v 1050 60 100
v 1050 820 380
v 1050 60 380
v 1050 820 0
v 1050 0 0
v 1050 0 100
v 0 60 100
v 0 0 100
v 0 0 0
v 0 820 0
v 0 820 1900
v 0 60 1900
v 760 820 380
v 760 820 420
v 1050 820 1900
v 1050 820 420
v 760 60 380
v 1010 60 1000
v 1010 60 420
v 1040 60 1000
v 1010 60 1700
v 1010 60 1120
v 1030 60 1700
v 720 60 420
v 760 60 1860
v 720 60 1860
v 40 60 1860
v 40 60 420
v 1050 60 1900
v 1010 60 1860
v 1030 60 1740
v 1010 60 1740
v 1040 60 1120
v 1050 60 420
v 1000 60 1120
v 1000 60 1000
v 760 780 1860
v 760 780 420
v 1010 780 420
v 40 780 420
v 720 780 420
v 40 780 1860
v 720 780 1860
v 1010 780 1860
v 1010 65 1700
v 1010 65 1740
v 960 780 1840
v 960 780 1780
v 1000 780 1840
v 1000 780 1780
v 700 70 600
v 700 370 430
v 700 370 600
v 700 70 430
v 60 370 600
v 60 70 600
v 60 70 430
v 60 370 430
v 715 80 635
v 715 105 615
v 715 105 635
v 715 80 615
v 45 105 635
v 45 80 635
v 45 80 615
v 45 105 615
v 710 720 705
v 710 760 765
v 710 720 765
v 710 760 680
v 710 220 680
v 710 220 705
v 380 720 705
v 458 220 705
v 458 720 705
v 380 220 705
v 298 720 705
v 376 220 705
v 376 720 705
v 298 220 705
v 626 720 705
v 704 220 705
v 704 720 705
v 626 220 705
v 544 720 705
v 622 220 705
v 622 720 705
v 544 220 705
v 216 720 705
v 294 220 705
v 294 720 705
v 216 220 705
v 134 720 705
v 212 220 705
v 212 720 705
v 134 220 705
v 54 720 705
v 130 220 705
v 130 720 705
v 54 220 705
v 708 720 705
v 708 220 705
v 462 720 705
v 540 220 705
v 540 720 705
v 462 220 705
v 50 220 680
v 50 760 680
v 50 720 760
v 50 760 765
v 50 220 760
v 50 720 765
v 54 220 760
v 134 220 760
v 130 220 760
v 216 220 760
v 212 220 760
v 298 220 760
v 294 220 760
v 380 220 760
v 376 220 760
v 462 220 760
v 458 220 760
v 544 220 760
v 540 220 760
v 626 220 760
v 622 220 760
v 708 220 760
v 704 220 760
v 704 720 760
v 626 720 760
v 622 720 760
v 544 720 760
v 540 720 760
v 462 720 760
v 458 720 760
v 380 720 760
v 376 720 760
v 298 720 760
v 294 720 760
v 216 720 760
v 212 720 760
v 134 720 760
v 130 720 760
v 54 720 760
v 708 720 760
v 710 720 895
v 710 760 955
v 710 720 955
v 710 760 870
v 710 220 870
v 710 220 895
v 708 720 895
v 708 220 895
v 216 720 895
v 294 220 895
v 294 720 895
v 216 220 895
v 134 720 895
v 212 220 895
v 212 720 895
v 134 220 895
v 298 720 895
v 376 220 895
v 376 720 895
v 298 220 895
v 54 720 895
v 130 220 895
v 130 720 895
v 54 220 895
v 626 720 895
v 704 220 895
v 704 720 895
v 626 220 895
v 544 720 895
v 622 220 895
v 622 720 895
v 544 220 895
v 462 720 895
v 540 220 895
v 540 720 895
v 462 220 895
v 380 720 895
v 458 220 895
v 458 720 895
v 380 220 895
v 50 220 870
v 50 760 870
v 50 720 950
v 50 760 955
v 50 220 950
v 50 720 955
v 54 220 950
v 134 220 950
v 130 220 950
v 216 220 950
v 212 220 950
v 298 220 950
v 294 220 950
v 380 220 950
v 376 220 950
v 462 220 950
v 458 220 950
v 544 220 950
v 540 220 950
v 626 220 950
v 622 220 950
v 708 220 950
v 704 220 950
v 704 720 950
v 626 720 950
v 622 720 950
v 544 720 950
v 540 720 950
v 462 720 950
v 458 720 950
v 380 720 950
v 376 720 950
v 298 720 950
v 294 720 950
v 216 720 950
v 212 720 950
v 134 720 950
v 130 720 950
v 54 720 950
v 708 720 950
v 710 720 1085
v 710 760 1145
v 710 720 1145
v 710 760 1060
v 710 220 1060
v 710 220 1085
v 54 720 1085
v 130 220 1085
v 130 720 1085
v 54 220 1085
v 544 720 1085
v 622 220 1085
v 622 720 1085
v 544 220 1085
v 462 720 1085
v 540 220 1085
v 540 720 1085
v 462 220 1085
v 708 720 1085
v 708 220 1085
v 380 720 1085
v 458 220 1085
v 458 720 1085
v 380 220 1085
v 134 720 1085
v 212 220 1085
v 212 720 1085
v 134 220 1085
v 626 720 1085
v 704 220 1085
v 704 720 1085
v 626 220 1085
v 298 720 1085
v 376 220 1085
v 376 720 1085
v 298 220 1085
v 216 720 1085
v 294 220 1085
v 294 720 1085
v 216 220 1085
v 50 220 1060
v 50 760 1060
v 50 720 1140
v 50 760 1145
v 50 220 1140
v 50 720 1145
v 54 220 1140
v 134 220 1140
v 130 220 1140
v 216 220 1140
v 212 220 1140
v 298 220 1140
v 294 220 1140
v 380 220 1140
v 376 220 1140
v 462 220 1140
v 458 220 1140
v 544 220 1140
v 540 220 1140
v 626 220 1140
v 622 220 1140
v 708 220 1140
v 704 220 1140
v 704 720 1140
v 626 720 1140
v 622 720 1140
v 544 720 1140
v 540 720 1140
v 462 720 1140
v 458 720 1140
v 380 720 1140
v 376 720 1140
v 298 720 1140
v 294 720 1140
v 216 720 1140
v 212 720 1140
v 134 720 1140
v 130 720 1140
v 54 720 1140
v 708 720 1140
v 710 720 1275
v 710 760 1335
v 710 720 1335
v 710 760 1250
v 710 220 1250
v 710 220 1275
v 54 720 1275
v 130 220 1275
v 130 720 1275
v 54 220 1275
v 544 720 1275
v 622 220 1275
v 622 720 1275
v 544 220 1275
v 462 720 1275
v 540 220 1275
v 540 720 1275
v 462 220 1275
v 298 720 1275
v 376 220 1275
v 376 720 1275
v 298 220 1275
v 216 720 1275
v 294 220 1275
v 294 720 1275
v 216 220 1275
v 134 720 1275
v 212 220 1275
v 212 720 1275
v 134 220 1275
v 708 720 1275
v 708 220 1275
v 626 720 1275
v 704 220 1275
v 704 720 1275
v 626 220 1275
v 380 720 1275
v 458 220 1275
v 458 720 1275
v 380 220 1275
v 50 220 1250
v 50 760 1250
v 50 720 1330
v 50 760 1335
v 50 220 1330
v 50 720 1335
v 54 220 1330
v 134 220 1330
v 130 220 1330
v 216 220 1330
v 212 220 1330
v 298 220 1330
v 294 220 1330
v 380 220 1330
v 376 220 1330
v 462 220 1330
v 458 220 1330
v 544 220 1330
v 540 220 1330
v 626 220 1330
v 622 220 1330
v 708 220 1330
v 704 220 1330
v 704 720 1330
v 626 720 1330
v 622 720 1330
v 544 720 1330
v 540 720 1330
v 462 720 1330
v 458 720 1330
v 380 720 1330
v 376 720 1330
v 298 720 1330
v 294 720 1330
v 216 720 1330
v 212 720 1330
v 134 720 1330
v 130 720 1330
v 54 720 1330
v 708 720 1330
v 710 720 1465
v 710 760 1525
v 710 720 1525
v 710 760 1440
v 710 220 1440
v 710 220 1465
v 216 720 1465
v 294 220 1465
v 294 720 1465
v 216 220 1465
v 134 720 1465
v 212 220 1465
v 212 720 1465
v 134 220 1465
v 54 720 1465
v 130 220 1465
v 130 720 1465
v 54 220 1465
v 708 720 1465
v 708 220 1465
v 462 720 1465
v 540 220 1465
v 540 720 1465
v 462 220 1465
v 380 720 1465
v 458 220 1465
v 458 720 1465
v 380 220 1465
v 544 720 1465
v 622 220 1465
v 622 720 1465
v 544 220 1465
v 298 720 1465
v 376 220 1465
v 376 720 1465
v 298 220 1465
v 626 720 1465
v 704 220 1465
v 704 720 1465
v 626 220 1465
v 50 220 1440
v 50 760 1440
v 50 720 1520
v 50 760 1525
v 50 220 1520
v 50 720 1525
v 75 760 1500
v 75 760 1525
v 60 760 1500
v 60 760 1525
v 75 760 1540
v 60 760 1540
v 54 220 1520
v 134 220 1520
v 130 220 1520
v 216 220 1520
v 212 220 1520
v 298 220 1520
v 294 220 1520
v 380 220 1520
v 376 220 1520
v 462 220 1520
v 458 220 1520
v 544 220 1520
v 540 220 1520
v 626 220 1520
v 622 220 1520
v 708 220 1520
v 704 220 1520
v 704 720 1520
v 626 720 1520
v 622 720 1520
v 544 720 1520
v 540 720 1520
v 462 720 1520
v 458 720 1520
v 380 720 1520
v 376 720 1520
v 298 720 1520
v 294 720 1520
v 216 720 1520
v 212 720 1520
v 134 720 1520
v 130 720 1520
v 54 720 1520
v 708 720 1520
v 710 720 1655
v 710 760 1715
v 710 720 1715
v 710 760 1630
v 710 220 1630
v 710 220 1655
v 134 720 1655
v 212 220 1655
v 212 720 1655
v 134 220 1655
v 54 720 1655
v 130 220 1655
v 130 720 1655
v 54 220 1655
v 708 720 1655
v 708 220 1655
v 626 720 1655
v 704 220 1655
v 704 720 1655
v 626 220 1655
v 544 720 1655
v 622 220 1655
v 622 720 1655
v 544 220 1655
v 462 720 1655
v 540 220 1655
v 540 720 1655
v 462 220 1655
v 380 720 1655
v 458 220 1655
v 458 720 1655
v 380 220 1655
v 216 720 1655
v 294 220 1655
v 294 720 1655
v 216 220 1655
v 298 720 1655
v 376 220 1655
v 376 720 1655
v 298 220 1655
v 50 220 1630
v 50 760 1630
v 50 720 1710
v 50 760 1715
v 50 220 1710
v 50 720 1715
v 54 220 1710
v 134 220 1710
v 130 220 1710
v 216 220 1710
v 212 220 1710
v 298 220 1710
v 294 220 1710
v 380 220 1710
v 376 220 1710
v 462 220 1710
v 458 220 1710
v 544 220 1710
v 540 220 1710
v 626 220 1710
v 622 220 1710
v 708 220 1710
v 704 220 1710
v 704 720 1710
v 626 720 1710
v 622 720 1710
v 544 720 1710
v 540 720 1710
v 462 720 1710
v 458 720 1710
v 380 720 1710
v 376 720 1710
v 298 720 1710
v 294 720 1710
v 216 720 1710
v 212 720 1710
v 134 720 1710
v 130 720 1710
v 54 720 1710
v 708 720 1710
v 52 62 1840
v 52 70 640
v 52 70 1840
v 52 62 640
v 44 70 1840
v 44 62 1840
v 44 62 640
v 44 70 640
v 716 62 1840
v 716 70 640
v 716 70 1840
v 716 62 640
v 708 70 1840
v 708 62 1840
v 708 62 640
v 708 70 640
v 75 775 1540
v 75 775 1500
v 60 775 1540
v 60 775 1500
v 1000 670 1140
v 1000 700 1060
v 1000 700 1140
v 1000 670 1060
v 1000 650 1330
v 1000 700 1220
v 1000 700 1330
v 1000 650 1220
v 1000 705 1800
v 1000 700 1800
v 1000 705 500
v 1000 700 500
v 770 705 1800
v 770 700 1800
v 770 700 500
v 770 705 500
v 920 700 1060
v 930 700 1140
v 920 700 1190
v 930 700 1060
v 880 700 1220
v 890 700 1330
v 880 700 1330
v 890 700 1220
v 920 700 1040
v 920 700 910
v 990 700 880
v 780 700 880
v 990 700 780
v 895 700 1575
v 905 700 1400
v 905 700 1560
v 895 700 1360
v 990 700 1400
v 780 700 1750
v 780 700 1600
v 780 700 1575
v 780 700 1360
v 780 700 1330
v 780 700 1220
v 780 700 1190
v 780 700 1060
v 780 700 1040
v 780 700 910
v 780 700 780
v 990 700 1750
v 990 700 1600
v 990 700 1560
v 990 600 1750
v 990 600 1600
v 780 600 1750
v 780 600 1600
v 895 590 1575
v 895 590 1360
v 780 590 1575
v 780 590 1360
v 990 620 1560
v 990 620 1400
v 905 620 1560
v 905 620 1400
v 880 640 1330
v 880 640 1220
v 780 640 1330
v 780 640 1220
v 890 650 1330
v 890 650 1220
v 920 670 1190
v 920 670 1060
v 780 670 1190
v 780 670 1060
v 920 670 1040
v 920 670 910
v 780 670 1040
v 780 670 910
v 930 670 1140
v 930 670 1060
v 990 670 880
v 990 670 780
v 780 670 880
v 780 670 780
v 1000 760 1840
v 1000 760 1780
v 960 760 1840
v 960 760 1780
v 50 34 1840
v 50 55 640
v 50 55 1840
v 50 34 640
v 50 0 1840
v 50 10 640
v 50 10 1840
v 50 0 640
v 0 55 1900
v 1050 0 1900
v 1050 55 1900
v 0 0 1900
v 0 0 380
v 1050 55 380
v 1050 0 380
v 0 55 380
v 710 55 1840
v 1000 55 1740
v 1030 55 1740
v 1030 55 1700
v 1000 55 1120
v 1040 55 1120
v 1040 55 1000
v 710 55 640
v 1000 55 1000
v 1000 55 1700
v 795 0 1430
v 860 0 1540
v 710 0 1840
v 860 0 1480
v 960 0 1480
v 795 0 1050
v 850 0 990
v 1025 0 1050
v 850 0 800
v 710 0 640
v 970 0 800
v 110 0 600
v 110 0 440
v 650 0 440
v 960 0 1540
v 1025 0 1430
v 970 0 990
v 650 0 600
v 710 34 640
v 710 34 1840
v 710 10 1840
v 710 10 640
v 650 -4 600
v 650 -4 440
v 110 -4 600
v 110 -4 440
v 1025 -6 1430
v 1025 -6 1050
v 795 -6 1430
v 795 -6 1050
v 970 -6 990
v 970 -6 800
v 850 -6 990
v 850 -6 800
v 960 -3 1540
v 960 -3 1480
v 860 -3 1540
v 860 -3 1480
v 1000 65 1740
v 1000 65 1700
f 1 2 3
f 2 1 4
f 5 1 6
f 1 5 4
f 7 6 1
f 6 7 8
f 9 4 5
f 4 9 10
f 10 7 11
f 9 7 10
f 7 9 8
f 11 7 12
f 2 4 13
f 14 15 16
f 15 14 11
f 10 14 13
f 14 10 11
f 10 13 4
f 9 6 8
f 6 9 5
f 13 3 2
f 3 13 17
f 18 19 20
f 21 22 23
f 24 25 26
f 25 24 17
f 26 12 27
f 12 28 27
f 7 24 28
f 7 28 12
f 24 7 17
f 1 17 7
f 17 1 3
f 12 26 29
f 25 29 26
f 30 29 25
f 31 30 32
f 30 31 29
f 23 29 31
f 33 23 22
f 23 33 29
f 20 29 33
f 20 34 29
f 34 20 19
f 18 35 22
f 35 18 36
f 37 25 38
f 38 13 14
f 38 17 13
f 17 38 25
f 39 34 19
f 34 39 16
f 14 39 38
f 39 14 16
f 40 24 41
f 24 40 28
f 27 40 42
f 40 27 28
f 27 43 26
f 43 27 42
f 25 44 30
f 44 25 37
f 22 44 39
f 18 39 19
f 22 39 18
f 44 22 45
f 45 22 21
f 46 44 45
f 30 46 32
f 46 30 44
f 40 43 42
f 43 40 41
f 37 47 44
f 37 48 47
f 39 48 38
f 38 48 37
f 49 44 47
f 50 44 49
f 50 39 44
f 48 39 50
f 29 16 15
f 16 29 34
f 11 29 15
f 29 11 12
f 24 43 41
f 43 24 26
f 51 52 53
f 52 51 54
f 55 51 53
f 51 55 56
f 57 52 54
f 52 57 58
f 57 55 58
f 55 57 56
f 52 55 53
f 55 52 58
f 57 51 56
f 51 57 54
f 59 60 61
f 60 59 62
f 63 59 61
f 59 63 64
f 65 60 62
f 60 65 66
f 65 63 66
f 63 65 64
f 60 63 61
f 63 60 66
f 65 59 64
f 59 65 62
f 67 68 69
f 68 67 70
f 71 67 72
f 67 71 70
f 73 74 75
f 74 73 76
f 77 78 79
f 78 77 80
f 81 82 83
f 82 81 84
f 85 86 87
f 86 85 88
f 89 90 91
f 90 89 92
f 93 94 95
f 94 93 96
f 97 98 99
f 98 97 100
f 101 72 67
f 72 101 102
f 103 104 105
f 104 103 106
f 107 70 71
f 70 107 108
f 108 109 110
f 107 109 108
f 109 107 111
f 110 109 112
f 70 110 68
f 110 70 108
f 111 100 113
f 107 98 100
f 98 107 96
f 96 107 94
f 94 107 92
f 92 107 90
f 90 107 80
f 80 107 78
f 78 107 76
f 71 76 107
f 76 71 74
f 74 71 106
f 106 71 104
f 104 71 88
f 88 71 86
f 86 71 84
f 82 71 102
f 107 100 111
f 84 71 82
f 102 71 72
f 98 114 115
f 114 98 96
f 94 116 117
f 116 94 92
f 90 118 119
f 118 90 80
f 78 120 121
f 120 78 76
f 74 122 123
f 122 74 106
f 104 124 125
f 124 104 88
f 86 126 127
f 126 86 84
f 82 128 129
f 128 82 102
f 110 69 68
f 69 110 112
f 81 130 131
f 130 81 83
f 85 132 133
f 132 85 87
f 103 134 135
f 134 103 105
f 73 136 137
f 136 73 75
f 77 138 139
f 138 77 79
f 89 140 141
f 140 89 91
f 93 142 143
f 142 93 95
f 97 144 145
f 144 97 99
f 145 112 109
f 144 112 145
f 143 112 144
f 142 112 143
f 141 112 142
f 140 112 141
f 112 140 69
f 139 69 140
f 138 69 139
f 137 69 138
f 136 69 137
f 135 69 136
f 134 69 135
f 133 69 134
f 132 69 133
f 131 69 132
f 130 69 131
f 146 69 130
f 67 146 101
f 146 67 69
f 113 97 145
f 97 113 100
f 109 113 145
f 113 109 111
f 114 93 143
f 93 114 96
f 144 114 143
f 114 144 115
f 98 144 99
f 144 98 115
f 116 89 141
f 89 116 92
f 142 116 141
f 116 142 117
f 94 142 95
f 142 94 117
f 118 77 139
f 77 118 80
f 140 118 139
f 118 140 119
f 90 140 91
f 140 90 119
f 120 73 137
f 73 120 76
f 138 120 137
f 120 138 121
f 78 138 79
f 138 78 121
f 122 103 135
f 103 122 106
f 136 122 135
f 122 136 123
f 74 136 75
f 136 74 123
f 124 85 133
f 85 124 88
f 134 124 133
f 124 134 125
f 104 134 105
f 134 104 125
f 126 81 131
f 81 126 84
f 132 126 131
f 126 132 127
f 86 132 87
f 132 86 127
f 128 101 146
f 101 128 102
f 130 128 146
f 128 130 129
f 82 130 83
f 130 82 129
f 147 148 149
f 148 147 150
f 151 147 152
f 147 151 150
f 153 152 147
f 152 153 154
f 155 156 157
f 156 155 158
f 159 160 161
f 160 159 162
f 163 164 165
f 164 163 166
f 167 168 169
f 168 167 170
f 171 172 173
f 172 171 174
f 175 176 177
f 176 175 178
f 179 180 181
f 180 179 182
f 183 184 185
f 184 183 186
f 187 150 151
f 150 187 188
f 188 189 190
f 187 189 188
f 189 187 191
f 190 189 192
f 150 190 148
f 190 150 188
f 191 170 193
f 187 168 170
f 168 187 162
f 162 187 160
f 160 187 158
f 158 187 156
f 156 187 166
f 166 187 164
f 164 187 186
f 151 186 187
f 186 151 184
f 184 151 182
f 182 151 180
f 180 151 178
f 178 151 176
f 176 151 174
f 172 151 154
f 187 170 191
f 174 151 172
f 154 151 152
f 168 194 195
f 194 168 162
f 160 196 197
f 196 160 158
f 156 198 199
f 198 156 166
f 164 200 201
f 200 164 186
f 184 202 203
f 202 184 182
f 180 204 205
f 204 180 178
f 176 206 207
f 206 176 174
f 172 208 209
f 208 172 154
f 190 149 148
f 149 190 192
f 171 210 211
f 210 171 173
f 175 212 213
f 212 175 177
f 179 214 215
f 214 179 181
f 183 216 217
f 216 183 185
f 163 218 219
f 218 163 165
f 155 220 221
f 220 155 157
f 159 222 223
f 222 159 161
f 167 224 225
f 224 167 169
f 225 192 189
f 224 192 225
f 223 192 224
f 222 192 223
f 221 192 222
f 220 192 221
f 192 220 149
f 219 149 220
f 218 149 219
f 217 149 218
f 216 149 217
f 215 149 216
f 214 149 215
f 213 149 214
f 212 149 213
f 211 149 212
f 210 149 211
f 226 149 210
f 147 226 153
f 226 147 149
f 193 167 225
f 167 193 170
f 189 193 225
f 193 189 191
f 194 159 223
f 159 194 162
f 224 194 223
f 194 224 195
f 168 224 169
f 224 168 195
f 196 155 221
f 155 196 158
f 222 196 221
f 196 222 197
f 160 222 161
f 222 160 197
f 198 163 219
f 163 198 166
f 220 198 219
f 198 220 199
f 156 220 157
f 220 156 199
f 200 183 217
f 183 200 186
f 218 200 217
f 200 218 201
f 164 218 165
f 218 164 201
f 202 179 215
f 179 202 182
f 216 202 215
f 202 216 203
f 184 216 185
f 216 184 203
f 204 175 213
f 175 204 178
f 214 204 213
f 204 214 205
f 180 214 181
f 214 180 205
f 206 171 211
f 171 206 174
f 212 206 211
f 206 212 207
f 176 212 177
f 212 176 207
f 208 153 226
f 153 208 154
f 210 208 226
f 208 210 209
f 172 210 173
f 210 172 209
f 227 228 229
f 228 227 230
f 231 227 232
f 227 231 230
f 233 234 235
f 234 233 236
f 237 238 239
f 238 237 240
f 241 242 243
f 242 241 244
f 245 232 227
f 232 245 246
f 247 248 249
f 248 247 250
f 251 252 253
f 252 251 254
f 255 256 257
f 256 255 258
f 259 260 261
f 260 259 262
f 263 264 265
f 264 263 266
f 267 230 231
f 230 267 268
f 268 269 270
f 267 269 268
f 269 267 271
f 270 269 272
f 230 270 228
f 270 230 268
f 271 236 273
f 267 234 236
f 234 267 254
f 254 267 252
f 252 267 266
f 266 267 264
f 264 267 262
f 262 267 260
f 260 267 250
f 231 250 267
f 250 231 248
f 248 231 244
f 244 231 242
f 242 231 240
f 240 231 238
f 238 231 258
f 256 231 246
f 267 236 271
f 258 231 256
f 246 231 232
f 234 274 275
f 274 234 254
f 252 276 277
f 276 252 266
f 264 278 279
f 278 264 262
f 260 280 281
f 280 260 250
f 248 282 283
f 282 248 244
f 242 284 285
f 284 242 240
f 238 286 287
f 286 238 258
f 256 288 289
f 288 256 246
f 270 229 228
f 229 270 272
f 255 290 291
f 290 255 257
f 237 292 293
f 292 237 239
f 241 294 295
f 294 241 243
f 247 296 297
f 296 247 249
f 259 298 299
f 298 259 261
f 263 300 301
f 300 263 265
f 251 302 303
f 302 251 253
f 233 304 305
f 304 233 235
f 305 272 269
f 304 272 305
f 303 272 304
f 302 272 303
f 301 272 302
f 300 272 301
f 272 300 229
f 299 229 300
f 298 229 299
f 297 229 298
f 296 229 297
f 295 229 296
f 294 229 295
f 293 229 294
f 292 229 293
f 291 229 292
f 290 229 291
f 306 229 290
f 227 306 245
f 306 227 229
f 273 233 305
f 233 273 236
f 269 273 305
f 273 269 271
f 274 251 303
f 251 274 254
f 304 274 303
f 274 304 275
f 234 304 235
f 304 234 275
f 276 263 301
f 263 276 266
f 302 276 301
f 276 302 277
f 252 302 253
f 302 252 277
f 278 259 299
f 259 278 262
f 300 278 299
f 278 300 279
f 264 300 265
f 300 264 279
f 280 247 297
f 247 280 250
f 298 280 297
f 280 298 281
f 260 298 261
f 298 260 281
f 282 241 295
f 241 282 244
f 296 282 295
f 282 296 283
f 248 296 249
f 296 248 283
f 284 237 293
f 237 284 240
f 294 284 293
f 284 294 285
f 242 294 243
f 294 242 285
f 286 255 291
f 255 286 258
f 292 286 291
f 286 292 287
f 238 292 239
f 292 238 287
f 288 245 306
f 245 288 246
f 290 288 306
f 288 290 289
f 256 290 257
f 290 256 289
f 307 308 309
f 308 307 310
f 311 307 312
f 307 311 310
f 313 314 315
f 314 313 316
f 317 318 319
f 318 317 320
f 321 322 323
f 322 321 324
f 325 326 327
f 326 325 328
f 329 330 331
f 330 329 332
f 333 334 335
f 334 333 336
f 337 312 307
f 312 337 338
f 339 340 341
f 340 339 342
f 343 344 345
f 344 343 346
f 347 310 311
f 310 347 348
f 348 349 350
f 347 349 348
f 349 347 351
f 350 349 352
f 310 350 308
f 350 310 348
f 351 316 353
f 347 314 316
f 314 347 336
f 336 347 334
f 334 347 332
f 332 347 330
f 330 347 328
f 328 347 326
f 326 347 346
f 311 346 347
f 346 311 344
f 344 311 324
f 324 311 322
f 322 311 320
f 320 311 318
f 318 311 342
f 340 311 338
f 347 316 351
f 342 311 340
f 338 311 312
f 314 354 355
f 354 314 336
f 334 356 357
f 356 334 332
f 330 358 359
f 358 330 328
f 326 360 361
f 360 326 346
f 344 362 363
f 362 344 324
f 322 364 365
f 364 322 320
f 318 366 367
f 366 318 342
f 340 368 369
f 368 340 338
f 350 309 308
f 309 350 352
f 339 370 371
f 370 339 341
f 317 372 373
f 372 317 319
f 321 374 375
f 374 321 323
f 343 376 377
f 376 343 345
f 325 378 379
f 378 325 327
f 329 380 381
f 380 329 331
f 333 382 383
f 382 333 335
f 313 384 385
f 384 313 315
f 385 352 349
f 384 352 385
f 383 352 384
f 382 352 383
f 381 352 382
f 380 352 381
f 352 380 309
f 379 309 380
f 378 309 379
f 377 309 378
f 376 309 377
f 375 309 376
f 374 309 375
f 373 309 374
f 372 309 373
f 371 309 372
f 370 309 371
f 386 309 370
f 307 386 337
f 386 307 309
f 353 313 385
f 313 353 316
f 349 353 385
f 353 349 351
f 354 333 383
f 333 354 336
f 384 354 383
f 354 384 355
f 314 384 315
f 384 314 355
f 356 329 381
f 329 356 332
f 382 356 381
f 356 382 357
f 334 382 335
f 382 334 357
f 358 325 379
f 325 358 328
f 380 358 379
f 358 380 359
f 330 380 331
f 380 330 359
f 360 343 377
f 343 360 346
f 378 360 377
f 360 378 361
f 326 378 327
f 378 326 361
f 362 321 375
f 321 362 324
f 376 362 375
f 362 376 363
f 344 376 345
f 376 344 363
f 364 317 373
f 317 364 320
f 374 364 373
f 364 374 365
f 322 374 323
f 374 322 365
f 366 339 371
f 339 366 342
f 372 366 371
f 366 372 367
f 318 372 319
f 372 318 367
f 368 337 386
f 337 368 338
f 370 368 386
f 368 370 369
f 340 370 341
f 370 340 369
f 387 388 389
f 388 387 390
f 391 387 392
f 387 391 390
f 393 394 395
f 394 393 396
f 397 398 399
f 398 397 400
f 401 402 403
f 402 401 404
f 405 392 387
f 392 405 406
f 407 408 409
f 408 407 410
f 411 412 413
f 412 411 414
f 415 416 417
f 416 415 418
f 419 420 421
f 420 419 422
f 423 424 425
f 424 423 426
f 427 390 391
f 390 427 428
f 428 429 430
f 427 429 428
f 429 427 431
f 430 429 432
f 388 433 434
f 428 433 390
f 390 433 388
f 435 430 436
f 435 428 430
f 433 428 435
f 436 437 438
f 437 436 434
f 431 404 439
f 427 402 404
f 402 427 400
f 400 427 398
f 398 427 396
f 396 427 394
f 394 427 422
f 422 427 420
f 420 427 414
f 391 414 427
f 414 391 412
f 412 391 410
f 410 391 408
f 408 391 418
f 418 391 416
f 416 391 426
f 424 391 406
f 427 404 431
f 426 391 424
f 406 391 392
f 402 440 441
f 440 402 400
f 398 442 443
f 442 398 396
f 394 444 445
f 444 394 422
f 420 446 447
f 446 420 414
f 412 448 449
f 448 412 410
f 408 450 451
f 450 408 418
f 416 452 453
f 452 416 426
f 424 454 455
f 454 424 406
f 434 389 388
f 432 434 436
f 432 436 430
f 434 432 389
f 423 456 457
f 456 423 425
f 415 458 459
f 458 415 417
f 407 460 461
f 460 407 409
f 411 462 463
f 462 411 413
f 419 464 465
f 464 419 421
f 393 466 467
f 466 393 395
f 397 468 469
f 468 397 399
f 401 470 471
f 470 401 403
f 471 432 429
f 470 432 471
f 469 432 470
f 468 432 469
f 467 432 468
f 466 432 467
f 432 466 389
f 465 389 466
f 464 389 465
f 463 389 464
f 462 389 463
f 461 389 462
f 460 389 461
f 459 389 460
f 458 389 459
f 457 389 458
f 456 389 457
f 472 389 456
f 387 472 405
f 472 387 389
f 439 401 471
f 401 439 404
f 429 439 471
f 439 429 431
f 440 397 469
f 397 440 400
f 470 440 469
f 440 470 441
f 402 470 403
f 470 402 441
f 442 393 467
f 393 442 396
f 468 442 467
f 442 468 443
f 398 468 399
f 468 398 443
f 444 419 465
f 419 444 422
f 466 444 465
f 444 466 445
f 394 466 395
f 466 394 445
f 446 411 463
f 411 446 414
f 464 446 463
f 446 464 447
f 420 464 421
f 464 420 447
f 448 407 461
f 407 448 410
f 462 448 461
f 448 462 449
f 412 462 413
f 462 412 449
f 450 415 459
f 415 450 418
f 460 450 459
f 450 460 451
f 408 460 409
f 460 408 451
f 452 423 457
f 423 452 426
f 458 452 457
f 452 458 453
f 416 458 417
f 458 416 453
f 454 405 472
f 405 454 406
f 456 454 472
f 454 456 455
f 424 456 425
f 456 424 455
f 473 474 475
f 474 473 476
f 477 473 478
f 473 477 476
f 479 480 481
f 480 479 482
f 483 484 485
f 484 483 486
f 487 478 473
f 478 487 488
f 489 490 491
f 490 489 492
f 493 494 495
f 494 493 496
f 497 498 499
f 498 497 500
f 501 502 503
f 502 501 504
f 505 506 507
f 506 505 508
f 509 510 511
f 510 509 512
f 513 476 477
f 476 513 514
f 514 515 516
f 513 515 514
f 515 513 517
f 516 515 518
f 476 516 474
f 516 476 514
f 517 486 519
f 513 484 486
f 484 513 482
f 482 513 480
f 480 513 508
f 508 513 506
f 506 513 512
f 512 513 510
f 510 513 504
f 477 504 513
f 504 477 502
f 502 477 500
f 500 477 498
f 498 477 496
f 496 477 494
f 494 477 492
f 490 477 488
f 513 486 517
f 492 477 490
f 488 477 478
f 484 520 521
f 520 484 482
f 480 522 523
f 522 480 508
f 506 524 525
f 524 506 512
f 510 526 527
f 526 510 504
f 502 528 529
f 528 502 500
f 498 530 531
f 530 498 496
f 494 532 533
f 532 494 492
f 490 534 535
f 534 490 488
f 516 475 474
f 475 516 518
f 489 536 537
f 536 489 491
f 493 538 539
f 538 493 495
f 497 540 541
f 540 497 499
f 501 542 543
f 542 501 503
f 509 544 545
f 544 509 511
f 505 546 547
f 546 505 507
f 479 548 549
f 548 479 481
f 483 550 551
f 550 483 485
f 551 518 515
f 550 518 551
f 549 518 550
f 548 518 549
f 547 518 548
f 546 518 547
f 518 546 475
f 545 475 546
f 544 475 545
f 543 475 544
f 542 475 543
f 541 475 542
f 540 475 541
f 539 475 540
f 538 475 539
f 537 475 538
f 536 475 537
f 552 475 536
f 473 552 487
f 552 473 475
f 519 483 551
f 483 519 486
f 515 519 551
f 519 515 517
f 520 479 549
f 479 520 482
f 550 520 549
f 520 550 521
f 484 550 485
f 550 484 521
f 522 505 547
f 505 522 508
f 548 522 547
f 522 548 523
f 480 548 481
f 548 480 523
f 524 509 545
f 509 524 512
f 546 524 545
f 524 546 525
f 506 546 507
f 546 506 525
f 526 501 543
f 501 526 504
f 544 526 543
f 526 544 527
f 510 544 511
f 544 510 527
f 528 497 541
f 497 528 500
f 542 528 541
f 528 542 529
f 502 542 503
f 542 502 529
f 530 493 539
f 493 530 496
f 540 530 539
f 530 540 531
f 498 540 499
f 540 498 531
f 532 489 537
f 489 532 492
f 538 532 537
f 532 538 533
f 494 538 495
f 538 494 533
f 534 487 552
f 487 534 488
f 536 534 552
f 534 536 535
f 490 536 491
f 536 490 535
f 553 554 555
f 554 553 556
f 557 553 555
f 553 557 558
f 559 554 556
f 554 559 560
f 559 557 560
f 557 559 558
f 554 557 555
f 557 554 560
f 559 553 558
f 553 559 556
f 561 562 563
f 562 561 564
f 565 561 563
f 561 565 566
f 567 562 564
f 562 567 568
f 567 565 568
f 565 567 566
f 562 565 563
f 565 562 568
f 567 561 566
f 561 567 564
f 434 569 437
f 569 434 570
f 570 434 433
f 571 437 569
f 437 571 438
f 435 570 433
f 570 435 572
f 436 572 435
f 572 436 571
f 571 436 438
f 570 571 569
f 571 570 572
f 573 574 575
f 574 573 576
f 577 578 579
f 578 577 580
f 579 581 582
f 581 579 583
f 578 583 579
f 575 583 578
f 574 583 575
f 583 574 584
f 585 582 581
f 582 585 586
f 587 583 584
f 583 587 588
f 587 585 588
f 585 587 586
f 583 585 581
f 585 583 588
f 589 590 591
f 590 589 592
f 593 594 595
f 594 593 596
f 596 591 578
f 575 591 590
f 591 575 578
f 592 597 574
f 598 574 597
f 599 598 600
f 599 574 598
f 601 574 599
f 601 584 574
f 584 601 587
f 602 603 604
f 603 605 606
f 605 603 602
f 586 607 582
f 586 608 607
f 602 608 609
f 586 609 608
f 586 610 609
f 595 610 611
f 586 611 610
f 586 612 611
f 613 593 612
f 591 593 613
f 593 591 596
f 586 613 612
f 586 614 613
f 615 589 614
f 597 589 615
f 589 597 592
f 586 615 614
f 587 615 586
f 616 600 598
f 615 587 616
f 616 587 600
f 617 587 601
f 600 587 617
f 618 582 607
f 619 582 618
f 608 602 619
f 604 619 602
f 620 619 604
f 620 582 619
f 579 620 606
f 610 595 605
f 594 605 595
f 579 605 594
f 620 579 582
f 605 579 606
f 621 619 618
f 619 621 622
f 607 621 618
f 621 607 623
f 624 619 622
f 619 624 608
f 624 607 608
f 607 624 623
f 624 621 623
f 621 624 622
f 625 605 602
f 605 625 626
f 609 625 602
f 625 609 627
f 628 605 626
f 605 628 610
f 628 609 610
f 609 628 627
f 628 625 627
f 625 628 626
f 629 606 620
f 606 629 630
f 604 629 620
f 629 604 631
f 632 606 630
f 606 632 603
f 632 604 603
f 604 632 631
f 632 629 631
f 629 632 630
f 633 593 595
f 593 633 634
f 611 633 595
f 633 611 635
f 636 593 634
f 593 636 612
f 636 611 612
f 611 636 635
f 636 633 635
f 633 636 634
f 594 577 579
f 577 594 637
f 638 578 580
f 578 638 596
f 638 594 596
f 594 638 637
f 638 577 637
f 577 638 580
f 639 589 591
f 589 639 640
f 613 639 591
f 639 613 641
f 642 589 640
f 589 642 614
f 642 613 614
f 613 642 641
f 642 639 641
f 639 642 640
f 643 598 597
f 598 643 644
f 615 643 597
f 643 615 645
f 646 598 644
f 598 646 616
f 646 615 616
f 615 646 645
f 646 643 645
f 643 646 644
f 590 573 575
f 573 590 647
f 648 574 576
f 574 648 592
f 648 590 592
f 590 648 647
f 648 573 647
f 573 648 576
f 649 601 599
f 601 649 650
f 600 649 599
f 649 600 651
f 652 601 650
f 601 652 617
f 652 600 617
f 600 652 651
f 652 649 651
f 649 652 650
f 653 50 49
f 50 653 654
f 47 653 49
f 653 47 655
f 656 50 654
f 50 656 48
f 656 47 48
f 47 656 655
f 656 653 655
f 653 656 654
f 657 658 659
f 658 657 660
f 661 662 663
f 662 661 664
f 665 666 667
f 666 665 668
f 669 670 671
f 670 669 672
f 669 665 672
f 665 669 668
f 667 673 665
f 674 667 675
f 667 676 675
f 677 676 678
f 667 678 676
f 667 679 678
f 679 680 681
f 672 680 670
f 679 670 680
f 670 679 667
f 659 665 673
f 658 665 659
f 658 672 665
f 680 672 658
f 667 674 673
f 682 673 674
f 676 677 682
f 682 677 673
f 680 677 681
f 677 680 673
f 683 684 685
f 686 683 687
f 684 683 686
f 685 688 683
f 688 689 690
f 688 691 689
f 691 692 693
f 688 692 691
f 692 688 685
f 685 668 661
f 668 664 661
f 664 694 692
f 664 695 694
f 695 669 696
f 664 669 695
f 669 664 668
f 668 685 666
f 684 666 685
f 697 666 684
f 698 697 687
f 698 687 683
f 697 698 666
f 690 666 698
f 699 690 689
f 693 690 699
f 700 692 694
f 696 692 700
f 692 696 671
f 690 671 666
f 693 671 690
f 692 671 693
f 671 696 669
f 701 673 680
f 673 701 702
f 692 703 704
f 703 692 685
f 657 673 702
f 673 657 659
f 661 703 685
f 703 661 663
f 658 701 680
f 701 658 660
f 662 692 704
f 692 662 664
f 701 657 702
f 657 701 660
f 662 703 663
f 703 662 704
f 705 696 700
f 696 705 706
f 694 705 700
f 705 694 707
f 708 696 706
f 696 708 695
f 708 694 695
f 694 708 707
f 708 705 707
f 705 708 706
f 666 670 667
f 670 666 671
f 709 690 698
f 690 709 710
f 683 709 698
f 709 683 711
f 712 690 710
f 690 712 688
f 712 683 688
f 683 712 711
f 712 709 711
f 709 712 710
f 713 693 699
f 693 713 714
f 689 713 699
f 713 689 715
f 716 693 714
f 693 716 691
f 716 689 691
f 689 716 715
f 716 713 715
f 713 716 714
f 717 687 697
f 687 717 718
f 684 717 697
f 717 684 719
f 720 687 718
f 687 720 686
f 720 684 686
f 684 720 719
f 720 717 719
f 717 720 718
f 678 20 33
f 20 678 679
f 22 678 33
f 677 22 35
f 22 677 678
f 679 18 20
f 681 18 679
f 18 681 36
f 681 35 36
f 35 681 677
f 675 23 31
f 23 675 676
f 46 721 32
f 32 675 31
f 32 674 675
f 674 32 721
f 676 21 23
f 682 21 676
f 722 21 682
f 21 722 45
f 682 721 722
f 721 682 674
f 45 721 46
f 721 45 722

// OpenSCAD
// CampusVend cabinet 1050 x 820 x 1900 mm — generated by build_structure.py
show_door = true; show_inside = true; show_electronics = true;

color("#3d464d", 1) translate([0, 0, 0]) cube([1050, 820, 100]); // Plinth + 4 levelling feet
color("#3d464d", 1) translate([0, 60, 100]) cube([1050, 760, 280]); // Cooling deck bay
color("#c9d2d8", 1) translate([0, 60, 380]) cube([760, 760, 40]); // Compartment floor (insulated)
color("#c9d2d8", 1) translate([0, 60, 420]) cube([40, 760, 1440]); // Left side panel (insulated)
color("#c9d2d8", 1) translate([40, 780, 420]) cube([970, 40, 1440]); // Back panel (insulated)
color("#9aa3ab", 1) translate([1010, 60, 420]) cube([40, 760, 1440]); // Right side panel
color("#c9d2d8", 1) translate([0, 60, 1860]) cube([1050, 760, 40]); // Top panel (insulated)
color("#c9d2d8", 1) translate([720, 60, 420]) cube([40, 720, 1440]); // Divider wall (insulated)
if (show_inside) color("#9aa3ab", 1) translate([60, 70, 430]) cube([640, 300, 170]); // Pickup bin / delivery chute
if (show_inside) color("#0f766e", 1) translate([45, 80, 615]) cube([670, 25, 20]); // Drop sensor (IR light curtain)
if (show_inside) color("#e9ecef", 1) translate([50, 220, 680]) cube([660, 540, 25]); // Tray F (8 spirals)
if (show_inside) color("#3d464d", 1) translate([50, 720, 705]) cube([660, 40, 60]); // Tray F motor rail (8 x 24 V spiral motors)
if (show_inside) color("#9aa3ab", 1) translate([50, 220, 705]) cube([4, 500, 55]); // Tray F divider 1
if (show_inside) color("#9aa3ab", 1) translate([130, 220, 705]) cube([4, 500, 55]); // Tray F divider 2
if (show_inside) color("#9aa3ab", 1) translate([212, 220, 705]) cube([4, 500, 55]); // Tray F divider 3
if (show_inside) color("#9aa3ab", 1) translate([294, 220, 705]) cube([4, 500, 55]); // Tray F divider 4
if (show_inside) color("#9aa3ab", 1) translate([376, 220, 705]) cube([4, 500, 55]); // Tray F divider 5
if (show_inside) color("#9aa3ab", 1) translate([458, 220, 705]) cube([4, 500, 55]); // Tray F divider 6
if (show_inside) color("#9aa3ab", 1) translate([540, 220, 705]) cube([4, 500, 55]); // Tray F divider 7
if (show_inside) color("#9aa3ab", 1) translate([622, 220, 705]) cube([4, 500, 55]); // Tray F divider 8
if (show_inside) color("#9aa3ab", 1) translate([704, 220, 705]) cube([4, 500, 55]); // Tray F divider 9
if (show_inside) color("#e9ecef", 1) translate([50, 220, 870]) cube([660, 540, 25]); // Tray E (8 spirals)
if (show_inside) color("#3d464d", 1) translate([50, 720, 895]) cube([660, 40, 60]); // Tray E motor rail (8 x 24 V spiral motors)
if (show_inside) color("#9aa3ab", 1) translate([50, 220, 895]) cube([4, 500, 55]); // Tray E divider 1
if (show_inside) color("#9aa3ab", 1) translate([130, 220, 895]) cube([4, 500, 55]); // Tray E divider 2
if (show_inside) color("#9aa3ab", 1) translate([212, 220, 895]) cube([4, 500, 55]); // Tray E divider 3
if (show_inside) color("#9aa3ab", 1) translate([294, 220, 895]) cube([4, 500, 55]); // Tray E divider 4
if (show_inside) color("#9aa3ab", 1) translate([376, 220, 895]) cube([4, 500, 55]); // Tray E divider 5
if (show_inside) color("#9aa3ab", 1) translate([458, 220, 895]) cube([4, 500, 55]); // Tray E divider 6
if (show_inside) color("#9aa3ab", 1) translate([540, 220, 895]) cube([4, 500, 55]); // Tray E divider 7
if (show_inside) color("#9aa3ab", 1) translate([622, 220, 895]) cube([4, 500, 55]); // Tray E divider 8
if (show_inside) color("#9aa3ab", 1) translate([704, 220, 895]) cube([4, 500, 55]); // Tray E divider 9
if (show_inside) color("#e9ecef", 1) translate([50, 220, 1060]) cube([660, 540, 25]); // Tray D (8 spirals)
if (show_inside) color("#3d464d", 1) translate([50, 720, 1085]) cube([660, 40, 60]); // Tray D motor rail (8 x 24 V spiral motors)
if (show_inside) color("#9aa3ab", 1) translate([50, 220, 1085]) cube([4, 500, 55]); // Tray D divider 1
if (show_inside) color("#9aa3ab", 1) translate([130, 220, 1085]) cube([4, 500, 55]); // Tray D divider 2
if (show_inside) color("#9aa3ab", 1) translate([212, 220, 1085]) cube([4, 500, 55]); // Tray D divider 3
if (show_inside) color("#9aa3ab", 1) translate([294, 220, 1085]) cube([4, 500, 55]); // Tray D divider 4
if (show_inside) color("#9aa3ab", 1) translate([376, 220, 1085]) cube([4, 500, 55]); // Tray D divider 5
if (show_inside) color("#9aa3ab", 1) translate([458, 220, 1085]) cube([4, 500, 55]); // Tray D divider 6
if (show_inside) color("#9aa3ab", 1) translate([540, 220, 1085]) cube([4, 500, 55]); // Tray D divider 7
if (show_inside) color("#9aa3ab", 1) translate([622, 220, 1085]) cube([4, 500, 55]); // Tray D divider 8
if (show_inside) color("#9aa3ab", 1) translate([704, 220, 1085]) cube([4, 500, 55]); // Tray D divider 9
if (show_inside) color("#e9ecef", 1) translate([50, 220, 1250]) cube([660, 540, 25]); // Tray C (8 spirals)
if (show_inside) color("#3d464d", 1) translate([50, 720, 1275]) cube([660, 40, 60]); // Tray C motor rail (8 x 24 V spiral motors)
if (show_inside) color("#9aa3ab", 1) translate([50, 220, 1275]) cube([4, 500, 55]); // Tray C divider 1
if (show_inside) color("#9aa3ab", 1) translate([130, 220, 1275]) cube([4, 500, 55]); // Tray C divider 2
if (show_inside) color("#9aa3ab", 1) translate([212, 220, 1275]) cube([4, 500, 55]); // Tray C divider 3
if (show_inside) color("#9aa3ab", 1) translate([294, 220, 1275]) cube([4, 500, 55]); // Tray C divider 4
if (show_inside) color("#9aa3ab", 1) translate([376, 220, 1275]) cube([4, 500, 55]); // Tray C divider 5
if (show_inside) color("#9aa3ab", 1) translate([458, 220, 1275]) cube([4, 500, 55]); // Tray C divider 6
if (show_inside) color("#9aa3ab", 1) translate([540, 220, 1275]) cube([4, 500, 55]); // Tray C divider 7
if (show_inside) color("#9aa3ab", 1) translate([622, 220, 1275]) cube([4, 500, 55]); // Tray C divider 8
if (show_inside) color("#9aa3ab", 1) translate([704, 220, 1275]) cube([4, 500, 55]); // Tray C divider 9
if (show_inside) color("#e9ecef", 1) translate([50, 220, 1440]) cube([660, 540, 25]); // Tray B (8 spirals)
if (show_inside) color("#3d464d", 1) translate([50, 720, 1465]) cube([660, 40, 60]); // Tray B motor rail (8 x 24 V spiral motors)
if (show_inside) color("#9aa3ab", 1) translate([50, 220, 1465]) cube([4, 500, 55]); // Tray B divider 1
if (show_inside) color("#9aa3ab", 1) translate([130, 220, 1465]) cube([4, 500, 55]); // Tray B divider 2
if (show_inside) color("#9aa3ab", 1) translate([212, 220, 1465]) cube([4, 500, 55]); // Tray B divider 3
if (show_inside) color("#9aa3ab", 1) translate([294, 220, 1465]) cube([4, 500, 55]); // Tray B divider 4
if (show_inside) color("#9aa3ab", 1) translate([376, 220, 1465]) cube([4, 500, 55]); // Tray B divider 5
if (show_inside) color("#9aa3ab", 1) translate([458, 220, 1465]) cube([4, 500, 55]); // Tray B divider 6
if (show_inside) color("#9aa3ab", 1) translate([540, 220, 1465]) cube([4, 500, 55]); // Tray B divider 7
if (show_inside) color("#9aa3ab", 1) translate([622, 220, 1465]) cube([4, 500, 55]); // Tray B divider 8
if (show_inside) color("#9aa3ab", 1) translate([704, 220, 1465]) cube([4, 500, 55]); // Tray B divider 9
if (show_inside) color("#e9ecef", 1) translate([50, 220, 1630]) cube([660, 540, 25]); // Tray A (8 spirals)
if (show_inside) color("#3d464d", 1) translate([50, 720, 1655]) cube([660, 40, 60]); // Tray A motor rail (8 x 24 V spiral motors)
if (show_inside) color("#9aa3ab", 1) translate([50, 220, 1655]) cube([4, 500, 55]); // Tray A divider 1
if (show_inside) color("#9aa3ab", 1) translate([130, 220, 1655]) cube([4, 500, 55]); // Tray A divider 2
if (show_inside) color("#9aa3ab", 1) translate([212, 220, 1655]) cube([4, 500, 55]); // Tray A divider 3
if (show_inside) color("#9aa3ab", 1) translate([294, 220, 1655]) cube([4, 500, 55]); // Tray A divider 4
if (show_inside) color("#9aa3ab", 1) translate([376, 220, 1655]) cube([4, 500, 55]); // Tray A divider 5
if (show_inside) color("#9aa3ab", 1) translate([458, 220, 1655]) cube([4, 500, 55]); // Tray A divider 6
if (show_inside) color("#9aa3ab", 1) translate([540, 220, 1655]) cube([4, 500, 55]); // Tray A divider 7
if (show_inside) color("#9aa3ab", 1) translate([622, 220, 1655]) cube([4, 500, 55]); // Tray A divider 8
if (show_inside) color("#9aa3ab", 1) translate([704, 220, 1655]) cube([4, 500, 55]); // Tray A divider 9
if (show_inside) color("#ffe680", 1) translate([44, 62, 640]) cube([8, 8, 1200]); // LED strip left
if (show_inside) color("#ffe680", 1) translate([708, 62, 640]) cube([8, 8, 1200]); // LED strip right
if (show_inside) color("#0f766e", 1) translate([60, 760, 1500]) cube([15, 15, 40]); // Temperature sensor DS18B20
if (show_electronics) color("#9aa3ab", 1) translate([770, 700, 500]) cube([230, 5, 1300]); // Electronics mounting plate
if (show_electronics) color("#2e8b57", 1) translate([780, 600, 1600]) cube([210, 100, 150]); // Mains panel: MCB + RCBO + surge protector
if (show_electronics) color("#2e8b57", 1) translate([780, 590, 1360]) cube([115, 110, 215]); // 24 V 10 A power supply
if (show_electronics) color("#2e8b57", 1) translate([905, 620, 1400]) cube([85, 80, 160]); // 5 V 5 A power supply (Pi) + 12 V buck (screen)
if (show_electronics) color("#2e8b57", 1) translate([780, 640, 1220]) cube([100, 60, 110]); // Raspberry Pi 5 in DIN case
if (show_electronics) color("#2e8b57", 1) translate([890, 650, 1220]) cube([110, 50, 110]); // Arduino Mega 2560 + screw-terminal shield
if (show_electronics) color("#2e8b57", 1) translate([780, 670, 1060]) cube([140, 30, 130]); // Relay board 1 (rows)
if (show_electronics) color("#2e8b57", 1) translate([780, 670, 910]) cube([140, 30, 130]); // Relay board 2 (columns)
if (show_electronics) color("#2e8b57", 1) translate([930, 670, 1060]) cube([70, 30, 80]); // Relay board 3 (lights, lock, cooling)
if (show_electronics) color("#2e8b57", 1) translate([780, 670, 780]) cube([210, 30, 100]); // Terminal blocks + fuse holders
if (show_electronics) color("#0f766e", 1) translate([960, 760, 1780]) cube([40, 20, 60]); // Network: RJ45 bulkhead + Wi-Fi antenna
if (show_door) color("#3d464d", 1) translate([0, 0, 380]) cube([50, 55, 1520]); // Door left stile (hinge side)
if (show_door) color("#3d464d", 1) translate([50, 0, 1840]) cube([660, 55, 60]); // Door top rail
if (show_door) color("#7fd4e6", 0.35) translate([50, 10, 640]) cube([660, 24, 1200]); // Display window (double-glazed toughened glass)
if (show_door) color("#3d464d", 1) translate([50, 0, 380]) cube([660, 55, 260]); // Door lower panel
if (show_door) color("#9aa3ab", 1) translate([110, -4, 440]) cube([540, 8, 160]); // Pickup flap (push-in, anti-theft)
if (show_door) color("#3d464d", 1) translate([710, 0, 380]) cube([60, 55, 1520]); // Door mullion
if (show_door) color("#3d464d", 1) translate([770, 0, 380]) cube([280, 55, 1520]); // Control fascia
if (show_door) color("#111827", 1) translate([795, -6, 1050]) cube([230, 10, 380]); // Touchscreen 15.6" portrait
if (show_door) color("#1f2937", 1) translate([850, -6, 800]) cube([120, 10, 190]); // Card terminal (bank EDC) bay
if (show_door) color("#9aa3ab", 1) translate([860, -3, 1480]) cube([100, 5, 60]); // Speaker grille
if (show_door) color("#0f766e", 1) translate([1000, 20, 1000]) cube([40, 40, 120]); // Door lock (solenoid, 24 V) + key override
if (show_door) color("#0f766e", 1) translate([1000, 50, 1700]) cube([30, 15, 40]); // Door switch (reed)
